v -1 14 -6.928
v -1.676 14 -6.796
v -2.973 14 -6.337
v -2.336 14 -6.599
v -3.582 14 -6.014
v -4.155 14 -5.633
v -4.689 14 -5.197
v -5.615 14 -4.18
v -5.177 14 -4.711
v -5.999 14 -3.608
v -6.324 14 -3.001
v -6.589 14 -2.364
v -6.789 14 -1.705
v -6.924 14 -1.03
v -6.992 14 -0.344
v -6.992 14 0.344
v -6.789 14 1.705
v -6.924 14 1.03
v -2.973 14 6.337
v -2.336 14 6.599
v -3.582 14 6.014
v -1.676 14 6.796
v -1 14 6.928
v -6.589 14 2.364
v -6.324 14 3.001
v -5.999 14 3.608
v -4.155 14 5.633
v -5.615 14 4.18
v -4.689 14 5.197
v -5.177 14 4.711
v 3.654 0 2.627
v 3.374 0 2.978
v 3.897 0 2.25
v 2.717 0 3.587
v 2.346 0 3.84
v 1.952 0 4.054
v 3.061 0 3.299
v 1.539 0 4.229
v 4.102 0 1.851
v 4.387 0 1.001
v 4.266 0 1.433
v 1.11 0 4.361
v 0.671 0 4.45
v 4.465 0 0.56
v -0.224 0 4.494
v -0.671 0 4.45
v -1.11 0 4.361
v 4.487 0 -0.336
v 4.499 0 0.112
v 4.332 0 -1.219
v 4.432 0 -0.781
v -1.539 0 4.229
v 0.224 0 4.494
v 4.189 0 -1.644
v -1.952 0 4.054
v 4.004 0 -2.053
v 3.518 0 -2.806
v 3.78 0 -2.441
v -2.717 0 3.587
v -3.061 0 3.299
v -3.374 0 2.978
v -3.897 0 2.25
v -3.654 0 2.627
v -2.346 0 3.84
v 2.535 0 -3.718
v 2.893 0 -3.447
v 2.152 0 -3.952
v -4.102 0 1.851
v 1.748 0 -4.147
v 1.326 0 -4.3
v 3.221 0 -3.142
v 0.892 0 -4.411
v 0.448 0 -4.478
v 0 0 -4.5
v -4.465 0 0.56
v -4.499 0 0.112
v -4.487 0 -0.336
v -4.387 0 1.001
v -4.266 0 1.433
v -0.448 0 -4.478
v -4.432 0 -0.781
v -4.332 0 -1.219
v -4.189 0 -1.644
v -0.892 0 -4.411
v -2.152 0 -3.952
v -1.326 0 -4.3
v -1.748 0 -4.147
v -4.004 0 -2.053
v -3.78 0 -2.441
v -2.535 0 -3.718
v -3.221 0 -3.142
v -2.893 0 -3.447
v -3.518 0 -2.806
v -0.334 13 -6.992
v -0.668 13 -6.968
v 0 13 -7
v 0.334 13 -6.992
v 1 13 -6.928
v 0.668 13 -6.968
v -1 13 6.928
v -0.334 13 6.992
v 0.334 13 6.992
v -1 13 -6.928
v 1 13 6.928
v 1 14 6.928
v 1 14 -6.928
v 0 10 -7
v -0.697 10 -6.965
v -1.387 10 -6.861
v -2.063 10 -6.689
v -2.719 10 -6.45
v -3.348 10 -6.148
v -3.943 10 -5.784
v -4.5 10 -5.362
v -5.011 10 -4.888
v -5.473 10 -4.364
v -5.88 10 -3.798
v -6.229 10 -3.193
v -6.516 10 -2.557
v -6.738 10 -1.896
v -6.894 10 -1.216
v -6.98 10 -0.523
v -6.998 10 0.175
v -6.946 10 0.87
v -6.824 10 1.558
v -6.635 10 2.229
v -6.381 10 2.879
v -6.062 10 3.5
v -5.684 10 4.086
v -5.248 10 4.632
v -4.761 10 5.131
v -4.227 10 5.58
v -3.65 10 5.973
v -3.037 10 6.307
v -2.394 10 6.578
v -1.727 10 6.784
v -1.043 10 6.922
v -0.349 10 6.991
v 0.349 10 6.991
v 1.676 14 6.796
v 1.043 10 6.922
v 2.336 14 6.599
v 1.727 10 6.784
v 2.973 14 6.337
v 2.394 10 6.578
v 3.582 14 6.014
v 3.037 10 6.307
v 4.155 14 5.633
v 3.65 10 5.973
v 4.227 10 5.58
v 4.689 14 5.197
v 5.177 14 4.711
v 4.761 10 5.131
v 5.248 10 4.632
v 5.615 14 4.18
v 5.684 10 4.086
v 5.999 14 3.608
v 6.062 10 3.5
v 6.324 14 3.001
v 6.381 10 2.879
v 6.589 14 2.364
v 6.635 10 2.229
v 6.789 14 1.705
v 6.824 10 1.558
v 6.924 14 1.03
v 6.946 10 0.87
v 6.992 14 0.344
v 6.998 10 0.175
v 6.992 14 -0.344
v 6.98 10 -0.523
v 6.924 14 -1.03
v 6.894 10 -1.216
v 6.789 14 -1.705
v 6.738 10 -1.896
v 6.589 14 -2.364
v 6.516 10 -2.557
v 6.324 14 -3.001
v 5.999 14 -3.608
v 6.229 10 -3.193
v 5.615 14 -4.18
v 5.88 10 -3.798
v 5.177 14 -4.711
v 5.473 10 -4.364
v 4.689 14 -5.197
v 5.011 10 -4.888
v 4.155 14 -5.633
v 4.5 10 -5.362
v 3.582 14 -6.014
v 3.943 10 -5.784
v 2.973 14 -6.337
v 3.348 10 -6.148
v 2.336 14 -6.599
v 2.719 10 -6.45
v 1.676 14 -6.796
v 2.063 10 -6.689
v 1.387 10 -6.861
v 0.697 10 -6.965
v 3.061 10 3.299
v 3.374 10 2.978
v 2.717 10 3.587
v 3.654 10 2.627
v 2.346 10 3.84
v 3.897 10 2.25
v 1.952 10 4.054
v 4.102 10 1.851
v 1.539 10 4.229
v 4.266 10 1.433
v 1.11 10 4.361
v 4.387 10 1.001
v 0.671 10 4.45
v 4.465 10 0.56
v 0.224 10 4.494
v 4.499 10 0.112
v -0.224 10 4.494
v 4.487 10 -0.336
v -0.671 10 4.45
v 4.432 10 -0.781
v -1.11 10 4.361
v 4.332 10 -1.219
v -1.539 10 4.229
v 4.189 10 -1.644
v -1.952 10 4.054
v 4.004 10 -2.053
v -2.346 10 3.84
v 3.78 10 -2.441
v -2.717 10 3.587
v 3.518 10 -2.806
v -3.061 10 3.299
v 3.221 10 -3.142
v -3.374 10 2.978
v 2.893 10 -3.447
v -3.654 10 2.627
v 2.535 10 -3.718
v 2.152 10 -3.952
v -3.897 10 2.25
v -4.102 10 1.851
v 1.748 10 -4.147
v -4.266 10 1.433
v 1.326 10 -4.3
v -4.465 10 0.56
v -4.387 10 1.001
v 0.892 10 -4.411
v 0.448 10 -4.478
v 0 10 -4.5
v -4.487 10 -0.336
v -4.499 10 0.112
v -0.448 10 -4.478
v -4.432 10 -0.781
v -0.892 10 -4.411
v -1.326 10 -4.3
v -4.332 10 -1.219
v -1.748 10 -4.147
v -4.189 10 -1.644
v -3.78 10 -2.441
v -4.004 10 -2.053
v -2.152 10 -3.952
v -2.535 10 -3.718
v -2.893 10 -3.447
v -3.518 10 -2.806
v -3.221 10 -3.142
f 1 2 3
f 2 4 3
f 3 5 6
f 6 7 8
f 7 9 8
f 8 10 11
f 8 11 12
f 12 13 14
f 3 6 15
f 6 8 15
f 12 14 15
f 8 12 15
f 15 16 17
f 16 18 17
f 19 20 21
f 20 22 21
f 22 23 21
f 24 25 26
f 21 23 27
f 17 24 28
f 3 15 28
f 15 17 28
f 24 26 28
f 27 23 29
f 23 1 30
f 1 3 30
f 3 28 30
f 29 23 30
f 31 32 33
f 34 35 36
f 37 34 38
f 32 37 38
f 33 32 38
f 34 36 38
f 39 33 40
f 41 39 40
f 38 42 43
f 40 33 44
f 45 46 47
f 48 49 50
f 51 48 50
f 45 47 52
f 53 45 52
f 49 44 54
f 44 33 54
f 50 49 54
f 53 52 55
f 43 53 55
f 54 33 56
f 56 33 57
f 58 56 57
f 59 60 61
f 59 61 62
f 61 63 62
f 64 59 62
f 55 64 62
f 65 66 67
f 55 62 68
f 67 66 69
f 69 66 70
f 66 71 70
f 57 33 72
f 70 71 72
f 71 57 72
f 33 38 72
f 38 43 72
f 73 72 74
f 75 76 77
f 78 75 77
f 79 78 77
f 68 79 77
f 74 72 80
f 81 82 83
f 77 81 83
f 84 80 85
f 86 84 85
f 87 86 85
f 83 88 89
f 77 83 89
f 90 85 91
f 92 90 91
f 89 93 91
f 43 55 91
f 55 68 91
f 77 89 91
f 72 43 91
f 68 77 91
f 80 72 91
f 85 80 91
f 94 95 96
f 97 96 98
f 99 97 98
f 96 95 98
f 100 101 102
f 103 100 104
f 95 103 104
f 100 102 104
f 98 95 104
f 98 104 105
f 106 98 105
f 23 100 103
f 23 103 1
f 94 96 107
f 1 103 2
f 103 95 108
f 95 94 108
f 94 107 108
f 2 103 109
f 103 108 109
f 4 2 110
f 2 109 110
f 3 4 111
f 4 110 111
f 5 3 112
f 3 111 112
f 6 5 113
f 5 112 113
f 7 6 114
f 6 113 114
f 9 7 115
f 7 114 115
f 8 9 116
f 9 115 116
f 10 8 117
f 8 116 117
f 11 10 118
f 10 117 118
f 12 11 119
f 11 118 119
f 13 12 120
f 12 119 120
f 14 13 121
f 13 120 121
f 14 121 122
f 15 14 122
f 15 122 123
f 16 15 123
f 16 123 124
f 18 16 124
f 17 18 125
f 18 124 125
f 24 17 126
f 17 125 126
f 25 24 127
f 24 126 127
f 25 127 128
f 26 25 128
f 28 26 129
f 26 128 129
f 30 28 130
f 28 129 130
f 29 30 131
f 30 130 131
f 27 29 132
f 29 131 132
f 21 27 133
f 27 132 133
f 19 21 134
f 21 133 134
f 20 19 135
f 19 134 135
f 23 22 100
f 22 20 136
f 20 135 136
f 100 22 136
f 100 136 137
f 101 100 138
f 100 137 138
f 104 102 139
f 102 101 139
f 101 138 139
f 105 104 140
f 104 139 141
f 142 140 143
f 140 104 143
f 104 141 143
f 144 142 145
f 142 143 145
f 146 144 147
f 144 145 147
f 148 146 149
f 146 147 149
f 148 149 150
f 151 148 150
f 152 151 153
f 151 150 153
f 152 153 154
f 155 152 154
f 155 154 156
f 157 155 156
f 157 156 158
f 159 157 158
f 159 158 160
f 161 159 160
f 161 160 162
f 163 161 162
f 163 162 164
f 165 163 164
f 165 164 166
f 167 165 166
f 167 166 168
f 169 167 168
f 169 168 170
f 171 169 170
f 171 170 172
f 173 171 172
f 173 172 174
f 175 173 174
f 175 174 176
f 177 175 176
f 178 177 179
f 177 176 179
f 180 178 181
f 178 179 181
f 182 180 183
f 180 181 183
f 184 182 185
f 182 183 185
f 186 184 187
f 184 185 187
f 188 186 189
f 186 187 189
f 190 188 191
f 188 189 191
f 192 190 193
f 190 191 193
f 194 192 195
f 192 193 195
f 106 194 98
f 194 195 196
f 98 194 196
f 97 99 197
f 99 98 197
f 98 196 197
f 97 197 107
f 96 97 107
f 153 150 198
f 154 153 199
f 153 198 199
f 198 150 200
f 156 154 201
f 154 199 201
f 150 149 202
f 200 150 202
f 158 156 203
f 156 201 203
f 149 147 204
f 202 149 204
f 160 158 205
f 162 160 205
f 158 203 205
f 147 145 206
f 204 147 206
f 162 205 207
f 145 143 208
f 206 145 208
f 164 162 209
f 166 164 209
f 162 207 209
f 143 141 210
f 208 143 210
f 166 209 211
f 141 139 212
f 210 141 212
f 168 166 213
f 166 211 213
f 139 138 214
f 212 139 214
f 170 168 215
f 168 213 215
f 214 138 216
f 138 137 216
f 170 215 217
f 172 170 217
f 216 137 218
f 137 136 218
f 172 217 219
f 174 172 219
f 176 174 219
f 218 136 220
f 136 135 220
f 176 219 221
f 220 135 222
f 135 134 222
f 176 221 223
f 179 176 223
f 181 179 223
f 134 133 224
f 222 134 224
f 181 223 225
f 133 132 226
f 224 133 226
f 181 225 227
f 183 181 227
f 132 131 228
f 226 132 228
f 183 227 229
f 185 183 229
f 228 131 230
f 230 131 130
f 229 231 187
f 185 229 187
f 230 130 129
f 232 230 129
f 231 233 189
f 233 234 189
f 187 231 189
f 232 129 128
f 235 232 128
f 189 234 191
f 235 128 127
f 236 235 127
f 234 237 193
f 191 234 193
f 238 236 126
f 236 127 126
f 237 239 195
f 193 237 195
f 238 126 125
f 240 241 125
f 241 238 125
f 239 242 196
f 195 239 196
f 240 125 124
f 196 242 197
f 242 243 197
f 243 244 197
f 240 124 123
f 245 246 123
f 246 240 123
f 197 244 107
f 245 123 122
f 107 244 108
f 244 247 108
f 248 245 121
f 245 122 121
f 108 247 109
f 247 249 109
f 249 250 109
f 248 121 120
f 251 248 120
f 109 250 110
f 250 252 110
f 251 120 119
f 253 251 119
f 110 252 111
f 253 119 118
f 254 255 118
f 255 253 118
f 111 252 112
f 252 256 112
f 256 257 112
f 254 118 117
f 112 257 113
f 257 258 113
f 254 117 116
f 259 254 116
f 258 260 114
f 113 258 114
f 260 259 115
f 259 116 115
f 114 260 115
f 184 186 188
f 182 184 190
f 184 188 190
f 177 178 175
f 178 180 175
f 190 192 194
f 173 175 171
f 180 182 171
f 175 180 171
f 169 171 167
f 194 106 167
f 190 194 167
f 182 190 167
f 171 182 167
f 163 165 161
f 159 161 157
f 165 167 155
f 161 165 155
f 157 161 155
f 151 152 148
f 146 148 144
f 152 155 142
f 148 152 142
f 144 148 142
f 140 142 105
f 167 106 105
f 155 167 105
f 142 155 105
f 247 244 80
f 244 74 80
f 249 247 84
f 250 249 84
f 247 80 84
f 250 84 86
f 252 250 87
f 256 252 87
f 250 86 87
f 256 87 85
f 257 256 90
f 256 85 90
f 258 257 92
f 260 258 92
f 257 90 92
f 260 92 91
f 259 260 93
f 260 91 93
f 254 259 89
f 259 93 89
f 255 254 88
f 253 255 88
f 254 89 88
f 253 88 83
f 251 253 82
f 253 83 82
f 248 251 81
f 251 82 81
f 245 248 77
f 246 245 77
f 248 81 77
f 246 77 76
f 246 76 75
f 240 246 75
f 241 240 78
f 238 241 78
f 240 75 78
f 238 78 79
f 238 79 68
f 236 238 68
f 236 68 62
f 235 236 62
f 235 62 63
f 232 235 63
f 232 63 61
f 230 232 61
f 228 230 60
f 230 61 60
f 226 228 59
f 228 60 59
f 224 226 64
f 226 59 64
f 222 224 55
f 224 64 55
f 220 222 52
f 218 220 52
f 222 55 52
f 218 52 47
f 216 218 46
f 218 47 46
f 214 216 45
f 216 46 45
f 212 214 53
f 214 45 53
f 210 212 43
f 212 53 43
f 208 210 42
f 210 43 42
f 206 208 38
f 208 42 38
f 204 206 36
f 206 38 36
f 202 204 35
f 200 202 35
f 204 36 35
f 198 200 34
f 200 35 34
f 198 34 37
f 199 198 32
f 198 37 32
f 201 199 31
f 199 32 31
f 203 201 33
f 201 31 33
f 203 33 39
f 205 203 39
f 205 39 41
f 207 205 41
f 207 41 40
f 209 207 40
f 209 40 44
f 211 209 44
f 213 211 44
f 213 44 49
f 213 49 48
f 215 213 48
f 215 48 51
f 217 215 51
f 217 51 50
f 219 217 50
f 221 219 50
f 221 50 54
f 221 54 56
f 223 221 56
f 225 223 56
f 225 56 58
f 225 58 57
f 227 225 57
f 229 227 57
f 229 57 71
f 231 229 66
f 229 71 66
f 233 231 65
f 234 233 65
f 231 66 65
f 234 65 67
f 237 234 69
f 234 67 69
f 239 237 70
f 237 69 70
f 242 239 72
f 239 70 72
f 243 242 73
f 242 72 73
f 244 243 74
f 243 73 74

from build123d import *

# Parameters (mm, degrees)
SKETCH_3_W          = 2
SKETCH_3_H          = 2
CUT_EXTRUDE_1_DEPTH = 10


with BuildPart() as part:
    # 草图2 → 旋转1 (revolve)
    with BuildSketch(Plane.XY, mode=Mode.PRIVATE) as revolve_1_sk:
        Polygon((0, 0), (0, 14), (7, 14), (7, 10), (4.5, 10), (4.5, 0), align=None)
    revolve(revolve_1_sk.sketch.rotate(Axis((0, 0, 0), (0, 1, 0)), 90), axis=Axis((0, 0, 0), (0, 1, 0)))

    # 草图3 → 切除-拉伸1 (cut, symmetric)
    with BuildSketch(Plane.XY):
        with Locations((0, 14)):
            Rectangle(SKETCH_3_W, SKETCH_3_H)
    extrude(amount=CUT_EXTRUDE_1_DEPTH, both=True, mode=Mode.SUBTRACT)


solid = part.part
